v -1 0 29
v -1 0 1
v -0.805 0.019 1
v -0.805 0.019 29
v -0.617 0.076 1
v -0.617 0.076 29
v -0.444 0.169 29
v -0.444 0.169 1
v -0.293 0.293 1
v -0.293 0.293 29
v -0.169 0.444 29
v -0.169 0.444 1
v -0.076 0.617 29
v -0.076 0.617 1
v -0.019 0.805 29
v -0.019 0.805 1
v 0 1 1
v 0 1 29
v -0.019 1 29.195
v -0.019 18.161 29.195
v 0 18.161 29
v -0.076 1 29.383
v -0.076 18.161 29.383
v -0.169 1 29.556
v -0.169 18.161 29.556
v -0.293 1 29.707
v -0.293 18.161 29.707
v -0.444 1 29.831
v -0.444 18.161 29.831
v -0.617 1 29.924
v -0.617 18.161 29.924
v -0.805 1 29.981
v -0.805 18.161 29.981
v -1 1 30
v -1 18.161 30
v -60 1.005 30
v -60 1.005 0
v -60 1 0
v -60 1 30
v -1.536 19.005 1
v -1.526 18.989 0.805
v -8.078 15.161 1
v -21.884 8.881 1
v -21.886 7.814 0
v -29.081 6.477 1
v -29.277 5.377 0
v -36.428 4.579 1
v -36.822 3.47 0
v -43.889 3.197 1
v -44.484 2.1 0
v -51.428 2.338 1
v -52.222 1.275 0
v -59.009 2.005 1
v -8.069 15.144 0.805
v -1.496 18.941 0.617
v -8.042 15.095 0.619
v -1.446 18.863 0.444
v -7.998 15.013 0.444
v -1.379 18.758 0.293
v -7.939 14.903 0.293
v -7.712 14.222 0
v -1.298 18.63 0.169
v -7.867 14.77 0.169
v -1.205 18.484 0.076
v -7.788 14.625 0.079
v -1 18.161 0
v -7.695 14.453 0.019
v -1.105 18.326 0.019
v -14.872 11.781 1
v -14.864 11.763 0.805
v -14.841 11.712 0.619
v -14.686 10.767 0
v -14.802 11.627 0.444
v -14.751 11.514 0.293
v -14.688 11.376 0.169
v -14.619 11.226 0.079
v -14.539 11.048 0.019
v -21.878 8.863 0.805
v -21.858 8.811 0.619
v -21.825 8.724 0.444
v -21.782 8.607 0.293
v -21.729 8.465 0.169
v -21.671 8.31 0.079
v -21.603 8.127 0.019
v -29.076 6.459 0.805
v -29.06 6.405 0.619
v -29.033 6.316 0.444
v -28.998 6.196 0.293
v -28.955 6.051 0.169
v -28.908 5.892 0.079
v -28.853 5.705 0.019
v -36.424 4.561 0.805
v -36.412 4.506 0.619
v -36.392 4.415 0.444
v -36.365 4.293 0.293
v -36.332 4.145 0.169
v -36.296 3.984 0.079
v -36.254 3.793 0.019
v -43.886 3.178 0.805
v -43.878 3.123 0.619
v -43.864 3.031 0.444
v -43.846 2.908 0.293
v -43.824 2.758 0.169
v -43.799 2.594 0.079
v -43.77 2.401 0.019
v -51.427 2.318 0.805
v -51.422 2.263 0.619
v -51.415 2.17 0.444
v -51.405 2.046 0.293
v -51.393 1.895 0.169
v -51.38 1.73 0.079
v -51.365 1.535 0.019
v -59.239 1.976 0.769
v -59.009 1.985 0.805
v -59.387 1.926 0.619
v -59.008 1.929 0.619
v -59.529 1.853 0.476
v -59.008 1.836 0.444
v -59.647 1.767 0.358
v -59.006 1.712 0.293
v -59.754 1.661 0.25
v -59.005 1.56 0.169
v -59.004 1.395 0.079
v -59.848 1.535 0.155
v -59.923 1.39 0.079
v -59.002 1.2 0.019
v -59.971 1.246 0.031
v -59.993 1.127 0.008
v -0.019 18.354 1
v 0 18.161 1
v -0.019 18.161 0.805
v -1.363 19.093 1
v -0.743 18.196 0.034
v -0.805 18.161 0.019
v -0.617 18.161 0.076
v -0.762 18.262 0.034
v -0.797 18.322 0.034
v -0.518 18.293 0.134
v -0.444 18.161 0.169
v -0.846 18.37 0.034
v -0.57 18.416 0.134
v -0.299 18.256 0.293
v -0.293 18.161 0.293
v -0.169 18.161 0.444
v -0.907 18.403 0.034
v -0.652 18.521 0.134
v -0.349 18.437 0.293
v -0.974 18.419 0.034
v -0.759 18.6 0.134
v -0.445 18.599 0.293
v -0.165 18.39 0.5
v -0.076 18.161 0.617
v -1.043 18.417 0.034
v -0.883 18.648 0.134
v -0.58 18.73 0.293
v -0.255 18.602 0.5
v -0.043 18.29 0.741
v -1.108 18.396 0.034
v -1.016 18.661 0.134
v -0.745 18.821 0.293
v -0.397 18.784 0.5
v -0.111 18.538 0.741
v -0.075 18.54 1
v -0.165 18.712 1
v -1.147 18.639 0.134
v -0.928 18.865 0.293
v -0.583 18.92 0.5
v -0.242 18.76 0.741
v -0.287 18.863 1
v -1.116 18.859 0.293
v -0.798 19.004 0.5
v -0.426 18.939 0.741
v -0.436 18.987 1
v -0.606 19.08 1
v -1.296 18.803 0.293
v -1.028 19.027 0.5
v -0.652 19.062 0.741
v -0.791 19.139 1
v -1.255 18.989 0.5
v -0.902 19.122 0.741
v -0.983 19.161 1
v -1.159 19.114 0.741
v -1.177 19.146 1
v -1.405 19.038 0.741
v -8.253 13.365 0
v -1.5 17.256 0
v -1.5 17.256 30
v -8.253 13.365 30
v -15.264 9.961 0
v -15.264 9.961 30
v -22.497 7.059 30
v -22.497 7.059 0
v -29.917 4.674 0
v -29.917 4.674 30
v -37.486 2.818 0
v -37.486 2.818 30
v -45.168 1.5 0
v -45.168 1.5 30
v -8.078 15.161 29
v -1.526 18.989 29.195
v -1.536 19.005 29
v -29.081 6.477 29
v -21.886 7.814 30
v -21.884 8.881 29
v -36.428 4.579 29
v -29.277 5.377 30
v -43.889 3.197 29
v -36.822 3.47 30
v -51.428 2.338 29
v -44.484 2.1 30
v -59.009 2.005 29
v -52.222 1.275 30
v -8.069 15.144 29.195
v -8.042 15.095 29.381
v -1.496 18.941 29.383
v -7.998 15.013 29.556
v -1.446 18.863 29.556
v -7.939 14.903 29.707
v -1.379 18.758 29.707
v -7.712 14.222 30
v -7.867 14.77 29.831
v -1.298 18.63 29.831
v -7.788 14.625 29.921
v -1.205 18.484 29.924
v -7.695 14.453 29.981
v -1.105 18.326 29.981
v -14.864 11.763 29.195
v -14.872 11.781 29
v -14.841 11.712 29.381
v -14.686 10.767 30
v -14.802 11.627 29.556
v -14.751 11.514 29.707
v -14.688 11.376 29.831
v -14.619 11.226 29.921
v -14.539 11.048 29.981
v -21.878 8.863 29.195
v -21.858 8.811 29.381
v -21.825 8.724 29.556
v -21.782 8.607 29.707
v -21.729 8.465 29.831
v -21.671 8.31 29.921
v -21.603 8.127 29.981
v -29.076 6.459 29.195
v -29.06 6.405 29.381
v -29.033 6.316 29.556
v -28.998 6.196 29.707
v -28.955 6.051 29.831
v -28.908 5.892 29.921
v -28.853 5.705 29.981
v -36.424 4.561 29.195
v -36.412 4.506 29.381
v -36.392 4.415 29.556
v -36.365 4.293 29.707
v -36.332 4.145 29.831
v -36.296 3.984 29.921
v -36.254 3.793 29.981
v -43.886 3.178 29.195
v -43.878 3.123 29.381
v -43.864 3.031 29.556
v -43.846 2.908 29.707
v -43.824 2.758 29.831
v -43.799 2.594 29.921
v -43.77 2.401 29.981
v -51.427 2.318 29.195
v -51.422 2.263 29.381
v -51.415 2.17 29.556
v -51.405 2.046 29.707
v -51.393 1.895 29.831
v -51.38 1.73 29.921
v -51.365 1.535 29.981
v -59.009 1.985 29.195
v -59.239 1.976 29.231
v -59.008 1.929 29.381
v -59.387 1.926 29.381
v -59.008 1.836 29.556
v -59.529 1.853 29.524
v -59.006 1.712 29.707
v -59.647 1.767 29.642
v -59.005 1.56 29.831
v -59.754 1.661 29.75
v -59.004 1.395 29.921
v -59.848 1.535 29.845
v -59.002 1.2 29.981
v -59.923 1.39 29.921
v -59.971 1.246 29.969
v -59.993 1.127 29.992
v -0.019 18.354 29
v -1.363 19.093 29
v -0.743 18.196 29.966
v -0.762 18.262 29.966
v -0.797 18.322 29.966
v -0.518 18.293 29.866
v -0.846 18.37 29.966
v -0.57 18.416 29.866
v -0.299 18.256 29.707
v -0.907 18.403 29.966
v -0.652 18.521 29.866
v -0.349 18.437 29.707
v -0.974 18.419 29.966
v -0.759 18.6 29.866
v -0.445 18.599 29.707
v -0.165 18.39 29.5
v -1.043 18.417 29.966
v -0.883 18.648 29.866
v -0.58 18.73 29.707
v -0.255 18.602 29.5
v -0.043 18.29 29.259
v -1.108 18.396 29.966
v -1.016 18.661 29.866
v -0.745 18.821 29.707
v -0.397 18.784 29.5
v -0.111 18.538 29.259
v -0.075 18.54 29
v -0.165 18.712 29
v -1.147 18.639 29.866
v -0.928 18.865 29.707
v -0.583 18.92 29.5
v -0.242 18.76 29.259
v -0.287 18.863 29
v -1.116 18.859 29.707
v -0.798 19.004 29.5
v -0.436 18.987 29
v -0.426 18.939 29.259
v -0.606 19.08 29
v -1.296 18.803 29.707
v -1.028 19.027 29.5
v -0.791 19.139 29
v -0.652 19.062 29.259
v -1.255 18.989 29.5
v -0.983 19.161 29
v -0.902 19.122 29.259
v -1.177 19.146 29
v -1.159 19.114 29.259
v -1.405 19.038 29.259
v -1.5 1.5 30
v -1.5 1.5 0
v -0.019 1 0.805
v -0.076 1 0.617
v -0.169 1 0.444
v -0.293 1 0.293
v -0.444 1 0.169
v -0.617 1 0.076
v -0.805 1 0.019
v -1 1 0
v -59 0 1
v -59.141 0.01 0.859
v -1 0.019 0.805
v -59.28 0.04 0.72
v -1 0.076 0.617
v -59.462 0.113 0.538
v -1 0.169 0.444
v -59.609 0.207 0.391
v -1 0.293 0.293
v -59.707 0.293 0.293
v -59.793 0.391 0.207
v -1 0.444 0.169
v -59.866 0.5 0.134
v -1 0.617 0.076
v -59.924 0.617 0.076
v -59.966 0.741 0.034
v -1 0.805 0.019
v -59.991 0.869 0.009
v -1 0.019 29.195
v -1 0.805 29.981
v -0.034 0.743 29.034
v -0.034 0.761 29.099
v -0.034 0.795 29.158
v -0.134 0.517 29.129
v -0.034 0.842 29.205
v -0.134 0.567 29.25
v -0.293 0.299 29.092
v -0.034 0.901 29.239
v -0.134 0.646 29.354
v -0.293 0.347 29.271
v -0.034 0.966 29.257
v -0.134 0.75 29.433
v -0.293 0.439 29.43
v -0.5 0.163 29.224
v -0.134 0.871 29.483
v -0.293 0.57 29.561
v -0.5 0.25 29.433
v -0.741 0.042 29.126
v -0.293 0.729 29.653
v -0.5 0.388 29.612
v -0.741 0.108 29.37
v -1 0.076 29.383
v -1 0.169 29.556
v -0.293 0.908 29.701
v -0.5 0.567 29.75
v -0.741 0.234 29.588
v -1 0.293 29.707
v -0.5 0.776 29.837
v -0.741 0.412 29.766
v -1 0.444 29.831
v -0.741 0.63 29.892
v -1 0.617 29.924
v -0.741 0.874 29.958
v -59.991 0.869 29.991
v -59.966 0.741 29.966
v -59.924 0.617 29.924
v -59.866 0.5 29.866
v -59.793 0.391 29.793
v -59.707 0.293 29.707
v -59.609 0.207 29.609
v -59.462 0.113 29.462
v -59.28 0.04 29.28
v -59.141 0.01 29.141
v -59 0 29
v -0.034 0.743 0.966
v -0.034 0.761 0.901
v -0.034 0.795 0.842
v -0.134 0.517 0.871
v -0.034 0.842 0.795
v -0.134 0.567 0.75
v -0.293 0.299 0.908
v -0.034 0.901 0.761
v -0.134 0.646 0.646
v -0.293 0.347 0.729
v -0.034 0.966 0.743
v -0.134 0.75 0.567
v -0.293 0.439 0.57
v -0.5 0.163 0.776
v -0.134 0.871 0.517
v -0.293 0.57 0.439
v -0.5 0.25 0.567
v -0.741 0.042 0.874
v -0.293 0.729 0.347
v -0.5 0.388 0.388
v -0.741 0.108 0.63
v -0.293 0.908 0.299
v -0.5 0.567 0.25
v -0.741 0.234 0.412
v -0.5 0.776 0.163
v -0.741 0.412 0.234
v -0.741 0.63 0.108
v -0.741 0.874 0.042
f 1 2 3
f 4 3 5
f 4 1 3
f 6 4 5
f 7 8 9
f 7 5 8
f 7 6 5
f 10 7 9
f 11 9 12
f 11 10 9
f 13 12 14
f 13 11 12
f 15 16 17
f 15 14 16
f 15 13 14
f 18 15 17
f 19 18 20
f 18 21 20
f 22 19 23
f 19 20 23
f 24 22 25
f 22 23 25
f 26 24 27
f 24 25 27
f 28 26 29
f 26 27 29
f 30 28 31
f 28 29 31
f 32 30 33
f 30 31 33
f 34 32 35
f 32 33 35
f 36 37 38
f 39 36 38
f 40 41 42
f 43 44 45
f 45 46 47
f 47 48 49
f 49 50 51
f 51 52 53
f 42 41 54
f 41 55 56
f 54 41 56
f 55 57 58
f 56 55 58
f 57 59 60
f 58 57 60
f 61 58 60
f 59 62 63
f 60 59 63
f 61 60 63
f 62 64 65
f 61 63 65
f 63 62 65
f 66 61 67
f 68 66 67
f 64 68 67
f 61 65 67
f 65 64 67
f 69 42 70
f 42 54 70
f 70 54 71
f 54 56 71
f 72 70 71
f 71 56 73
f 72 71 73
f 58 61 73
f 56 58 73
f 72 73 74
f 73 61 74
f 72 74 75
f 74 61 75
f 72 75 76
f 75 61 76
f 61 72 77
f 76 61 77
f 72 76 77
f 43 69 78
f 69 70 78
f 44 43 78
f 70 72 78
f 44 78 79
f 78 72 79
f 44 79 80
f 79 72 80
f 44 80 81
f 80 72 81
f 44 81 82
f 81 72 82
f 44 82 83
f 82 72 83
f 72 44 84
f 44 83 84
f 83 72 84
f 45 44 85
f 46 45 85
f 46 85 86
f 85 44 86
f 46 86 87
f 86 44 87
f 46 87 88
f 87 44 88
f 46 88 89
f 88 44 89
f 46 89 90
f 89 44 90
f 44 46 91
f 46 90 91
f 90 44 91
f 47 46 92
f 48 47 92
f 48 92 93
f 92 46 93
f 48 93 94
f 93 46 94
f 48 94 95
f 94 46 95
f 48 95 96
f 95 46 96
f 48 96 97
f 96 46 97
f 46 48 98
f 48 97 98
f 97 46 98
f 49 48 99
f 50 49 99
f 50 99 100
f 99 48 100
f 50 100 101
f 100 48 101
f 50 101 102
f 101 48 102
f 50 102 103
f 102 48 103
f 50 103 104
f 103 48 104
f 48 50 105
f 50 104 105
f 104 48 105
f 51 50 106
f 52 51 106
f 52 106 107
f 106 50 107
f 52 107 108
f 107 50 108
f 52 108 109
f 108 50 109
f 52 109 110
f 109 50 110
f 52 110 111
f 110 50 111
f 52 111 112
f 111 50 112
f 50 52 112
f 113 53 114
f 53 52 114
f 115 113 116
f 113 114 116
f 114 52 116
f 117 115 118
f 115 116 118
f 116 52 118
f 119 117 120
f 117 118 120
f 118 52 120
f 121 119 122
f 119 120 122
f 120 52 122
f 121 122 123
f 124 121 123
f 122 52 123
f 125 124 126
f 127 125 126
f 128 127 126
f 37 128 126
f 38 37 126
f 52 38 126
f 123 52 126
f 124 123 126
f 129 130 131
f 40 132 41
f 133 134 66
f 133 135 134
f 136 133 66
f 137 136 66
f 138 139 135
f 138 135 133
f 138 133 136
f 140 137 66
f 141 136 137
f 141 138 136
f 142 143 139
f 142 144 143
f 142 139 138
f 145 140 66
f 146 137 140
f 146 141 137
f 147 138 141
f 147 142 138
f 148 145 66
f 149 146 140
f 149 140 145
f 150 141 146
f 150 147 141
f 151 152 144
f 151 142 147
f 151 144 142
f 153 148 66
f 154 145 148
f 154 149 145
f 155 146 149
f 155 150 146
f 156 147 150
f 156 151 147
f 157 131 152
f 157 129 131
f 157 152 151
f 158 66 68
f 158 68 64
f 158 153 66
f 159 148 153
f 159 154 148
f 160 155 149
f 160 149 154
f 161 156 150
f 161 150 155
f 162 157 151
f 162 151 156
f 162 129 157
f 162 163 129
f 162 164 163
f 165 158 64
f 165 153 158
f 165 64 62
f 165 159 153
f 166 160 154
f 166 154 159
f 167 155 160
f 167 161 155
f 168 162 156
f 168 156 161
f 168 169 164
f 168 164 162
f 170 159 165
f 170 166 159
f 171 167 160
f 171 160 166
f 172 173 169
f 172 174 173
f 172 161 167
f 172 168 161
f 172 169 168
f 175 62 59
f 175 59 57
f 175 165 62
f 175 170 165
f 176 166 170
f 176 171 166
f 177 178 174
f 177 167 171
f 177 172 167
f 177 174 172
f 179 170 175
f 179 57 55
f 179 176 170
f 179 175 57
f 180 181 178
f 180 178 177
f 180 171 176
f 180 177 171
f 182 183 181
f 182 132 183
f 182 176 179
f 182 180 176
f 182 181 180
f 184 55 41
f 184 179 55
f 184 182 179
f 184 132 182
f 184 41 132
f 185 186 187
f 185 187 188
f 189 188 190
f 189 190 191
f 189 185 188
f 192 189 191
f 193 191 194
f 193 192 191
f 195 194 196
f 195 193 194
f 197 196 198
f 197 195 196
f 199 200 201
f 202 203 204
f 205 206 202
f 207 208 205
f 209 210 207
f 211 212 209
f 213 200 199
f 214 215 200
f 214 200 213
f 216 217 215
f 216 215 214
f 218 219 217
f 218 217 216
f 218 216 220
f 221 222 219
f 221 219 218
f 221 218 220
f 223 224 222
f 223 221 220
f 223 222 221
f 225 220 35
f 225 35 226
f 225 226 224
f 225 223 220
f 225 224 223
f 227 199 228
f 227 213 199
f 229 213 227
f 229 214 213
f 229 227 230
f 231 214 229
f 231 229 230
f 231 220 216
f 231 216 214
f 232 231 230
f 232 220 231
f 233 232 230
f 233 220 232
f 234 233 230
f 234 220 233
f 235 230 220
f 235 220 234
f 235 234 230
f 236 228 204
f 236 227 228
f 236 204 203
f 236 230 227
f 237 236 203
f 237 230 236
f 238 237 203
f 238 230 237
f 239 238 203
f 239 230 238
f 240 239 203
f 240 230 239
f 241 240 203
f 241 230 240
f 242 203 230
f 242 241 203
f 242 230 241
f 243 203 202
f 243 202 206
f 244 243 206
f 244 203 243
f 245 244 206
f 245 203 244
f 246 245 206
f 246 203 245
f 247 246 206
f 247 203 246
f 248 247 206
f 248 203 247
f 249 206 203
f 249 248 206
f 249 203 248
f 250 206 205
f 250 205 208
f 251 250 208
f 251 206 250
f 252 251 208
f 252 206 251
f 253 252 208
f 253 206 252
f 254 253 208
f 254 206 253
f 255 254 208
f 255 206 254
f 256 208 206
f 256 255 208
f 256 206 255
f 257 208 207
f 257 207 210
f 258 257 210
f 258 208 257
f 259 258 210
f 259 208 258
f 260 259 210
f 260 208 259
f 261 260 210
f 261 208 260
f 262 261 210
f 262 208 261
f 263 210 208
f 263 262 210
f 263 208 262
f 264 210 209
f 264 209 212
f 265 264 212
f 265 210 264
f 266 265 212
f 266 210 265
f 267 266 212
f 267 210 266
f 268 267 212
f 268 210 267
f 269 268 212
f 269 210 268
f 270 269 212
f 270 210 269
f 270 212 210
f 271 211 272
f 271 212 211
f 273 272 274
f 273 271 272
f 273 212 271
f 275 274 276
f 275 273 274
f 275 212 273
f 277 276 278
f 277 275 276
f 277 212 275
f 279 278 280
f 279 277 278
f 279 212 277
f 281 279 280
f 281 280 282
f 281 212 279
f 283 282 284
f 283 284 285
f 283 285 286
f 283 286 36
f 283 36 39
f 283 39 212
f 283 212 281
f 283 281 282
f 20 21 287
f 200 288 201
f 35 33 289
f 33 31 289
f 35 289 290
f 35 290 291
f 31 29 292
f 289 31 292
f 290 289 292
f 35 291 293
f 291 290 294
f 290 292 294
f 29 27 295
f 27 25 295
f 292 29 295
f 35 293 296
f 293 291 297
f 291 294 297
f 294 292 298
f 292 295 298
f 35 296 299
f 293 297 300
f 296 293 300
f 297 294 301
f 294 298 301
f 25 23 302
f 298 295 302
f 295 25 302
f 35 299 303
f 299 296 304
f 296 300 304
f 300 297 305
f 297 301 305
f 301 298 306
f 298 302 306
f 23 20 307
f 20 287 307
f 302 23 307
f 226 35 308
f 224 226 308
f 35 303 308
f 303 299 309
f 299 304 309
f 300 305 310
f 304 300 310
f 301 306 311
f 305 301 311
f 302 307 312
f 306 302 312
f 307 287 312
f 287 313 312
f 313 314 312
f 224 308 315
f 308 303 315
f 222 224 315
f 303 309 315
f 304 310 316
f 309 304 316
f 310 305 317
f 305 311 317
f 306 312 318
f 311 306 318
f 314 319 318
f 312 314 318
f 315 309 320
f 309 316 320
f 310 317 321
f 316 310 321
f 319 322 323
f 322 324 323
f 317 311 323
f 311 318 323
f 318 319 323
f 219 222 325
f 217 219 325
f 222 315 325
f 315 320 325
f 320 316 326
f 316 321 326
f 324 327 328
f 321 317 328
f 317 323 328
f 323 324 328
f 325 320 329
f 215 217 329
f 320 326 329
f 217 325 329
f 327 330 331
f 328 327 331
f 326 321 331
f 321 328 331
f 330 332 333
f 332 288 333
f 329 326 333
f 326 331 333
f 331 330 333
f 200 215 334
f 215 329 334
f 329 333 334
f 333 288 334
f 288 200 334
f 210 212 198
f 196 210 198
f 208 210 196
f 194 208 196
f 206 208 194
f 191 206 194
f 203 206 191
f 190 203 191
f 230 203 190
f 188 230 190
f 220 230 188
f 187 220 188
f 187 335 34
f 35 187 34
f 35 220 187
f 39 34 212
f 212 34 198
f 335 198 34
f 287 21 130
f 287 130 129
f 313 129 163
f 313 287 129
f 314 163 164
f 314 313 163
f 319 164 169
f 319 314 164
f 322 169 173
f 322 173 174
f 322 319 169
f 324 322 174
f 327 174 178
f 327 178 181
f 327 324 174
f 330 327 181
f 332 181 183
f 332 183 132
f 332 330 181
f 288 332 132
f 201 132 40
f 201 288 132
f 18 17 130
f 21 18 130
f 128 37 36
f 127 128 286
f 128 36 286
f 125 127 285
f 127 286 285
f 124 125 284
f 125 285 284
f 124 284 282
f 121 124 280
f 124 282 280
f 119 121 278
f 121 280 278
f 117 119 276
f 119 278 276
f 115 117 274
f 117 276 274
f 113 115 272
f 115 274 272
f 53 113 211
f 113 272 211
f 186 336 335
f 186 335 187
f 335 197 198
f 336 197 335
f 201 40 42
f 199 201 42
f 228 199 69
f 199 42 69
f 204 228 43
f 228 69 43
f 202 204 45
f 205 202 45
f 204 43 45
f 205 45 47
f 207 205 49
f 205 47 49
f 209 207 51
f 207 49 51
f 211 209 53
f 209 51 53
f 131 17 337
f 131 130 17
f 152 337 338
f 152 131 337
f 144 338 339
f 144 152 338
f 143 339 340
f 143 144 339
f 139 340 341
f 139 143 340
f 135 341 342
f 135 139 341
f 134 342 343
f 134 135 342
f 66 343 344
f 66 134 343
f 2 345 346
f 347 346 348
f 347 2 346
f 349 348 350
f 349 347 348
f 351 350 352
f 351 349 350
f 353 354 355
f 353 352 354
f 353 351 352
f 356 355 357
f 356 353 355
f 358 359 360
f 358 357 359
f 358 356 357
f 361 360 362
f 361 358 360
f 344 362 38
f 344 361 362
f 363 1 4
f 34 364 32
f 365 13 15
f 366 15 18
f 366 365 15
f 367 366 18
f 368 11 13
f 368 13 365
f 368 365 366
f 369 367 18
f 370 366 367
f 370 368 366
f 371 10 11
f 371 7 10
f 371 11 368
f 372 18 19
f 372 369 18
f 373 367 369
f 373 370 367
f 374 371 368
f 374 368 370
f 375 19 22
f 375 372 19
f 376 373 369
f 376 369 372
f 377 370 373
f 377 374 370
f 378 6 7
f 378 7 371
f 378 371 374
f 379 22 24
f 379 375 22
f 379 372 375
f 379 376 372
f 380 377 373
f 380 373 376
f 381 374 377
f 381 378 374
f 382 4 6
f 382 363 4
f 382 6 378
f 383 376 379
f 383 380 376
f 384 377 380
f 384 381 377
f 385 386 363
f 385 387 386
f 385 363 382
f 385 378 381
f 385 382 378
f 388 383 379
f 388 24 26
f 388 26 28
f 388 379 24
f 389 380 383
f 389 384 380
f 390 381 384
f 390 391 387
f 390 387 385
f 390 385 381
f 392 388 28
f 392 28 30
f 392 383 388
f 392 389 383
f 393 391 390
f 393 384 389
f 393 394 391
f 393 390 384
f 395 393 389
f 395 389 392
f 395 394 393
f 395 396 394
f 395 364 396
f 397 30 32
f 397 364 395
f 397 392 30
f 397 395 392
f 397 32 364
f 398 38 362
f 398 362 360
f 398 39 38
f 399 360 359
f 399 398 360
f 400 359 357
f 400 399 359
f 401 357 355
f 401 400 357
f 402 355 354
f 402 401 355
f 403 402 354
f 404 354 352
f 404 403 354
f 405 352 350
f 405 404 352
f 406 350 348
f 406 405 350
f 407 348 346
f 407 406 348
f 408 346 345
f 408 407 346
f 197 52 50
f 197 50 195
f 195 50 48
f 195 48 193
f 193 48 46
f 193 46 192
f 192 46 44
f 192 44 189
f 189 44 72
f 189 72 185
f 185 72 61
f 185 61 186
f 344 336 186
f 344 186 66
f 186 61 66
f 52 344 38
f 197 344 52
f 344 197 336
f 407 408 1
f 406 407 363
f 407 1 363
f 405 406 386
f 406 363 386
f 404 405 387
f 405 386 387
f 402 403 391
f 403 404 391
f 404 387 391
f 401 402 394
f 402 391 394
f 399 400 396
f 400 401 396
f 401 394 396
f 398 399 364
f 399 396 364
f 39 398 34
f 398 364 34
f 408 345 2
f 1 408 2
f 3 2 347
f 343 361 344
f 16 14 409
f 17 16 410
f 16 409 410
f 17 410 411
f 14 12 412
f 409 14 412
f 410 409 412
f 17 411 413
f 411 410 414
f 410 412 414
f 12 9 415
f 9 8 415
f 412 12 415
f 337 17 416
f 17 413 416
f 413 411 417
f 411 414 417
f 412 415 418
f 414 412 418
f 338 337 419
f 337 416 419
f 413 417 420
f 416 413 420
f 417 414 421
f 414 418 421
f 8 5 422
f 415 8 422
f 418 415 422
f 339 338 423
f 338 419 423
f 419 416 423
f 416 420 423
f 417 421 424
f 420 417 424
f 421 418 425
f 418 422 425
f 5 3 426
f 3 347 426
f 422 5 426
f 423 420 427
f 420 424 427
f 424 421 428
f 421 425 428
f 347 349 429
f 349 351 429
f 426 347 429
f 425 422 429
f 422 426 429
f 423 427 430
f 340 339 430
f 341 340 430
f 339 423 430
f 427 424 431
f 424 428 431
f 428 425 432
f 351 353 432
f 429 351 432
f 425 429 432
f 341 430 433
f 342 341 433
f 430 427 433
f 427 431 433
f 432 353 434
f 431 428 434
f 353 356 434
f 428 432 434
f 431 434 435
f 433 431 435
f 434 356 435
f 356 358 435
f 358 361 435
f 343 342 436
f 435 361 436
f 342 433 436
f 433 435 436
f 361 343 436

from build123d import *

# Parameters (mm, degrees)
F1_DEPTH = 30
F2_T     = -1.5
F3_R     = 0.99999


# Not quite as in the source:
# - a fillet or chamfer is up to 0.001 mm smaller than in the source, because OpenCascade refuses the exact size


with BuildPart() as f1:
    # F0 (on Top) → F1 (new body)
    with BuildSketch(Plane.XY):
        with BuildLine():
            Line((-60, 2), (-60, 0))
            Line((-60, 0), (0, 0))
            Line((0, 0), (0, 20))
            ThreePointArc((0, 20), (-28.6790804733, 6.5969349109), (-60, 2))
        make_face()
    extrude(amount=F1_DEPTH)

    # F2
    f2_openings = [f1.faces().sort_by_distance(p)[0] for p in [
        (-18.660264, 5.692192, 30),
        (-18.660264, 5.692192, 0),
    ]]
    offset(amount=F2_T, openings=f2_openings)

    # F3 (radius 1 in the source; OpenCascade refuses exactly that, so slightly less here)
    f3_edges = [f1.edges().sort_by_distance(p)[0] for p in [
        (-60, 2, 15),
        (-60, 0, 15),
        (-28.67908, 6.596935, 30),
        (-30, 0, 30),
        (-28.67908, 6.596935, 0),
        (-30, 0, 0),
        (0, 20, 15),
        (0, 0, 15),
        (0, 10, 30),
        (0, 10, 0),
    ]]
    fillet(f3_edges, radius=F3_R)


solid = f1.part
